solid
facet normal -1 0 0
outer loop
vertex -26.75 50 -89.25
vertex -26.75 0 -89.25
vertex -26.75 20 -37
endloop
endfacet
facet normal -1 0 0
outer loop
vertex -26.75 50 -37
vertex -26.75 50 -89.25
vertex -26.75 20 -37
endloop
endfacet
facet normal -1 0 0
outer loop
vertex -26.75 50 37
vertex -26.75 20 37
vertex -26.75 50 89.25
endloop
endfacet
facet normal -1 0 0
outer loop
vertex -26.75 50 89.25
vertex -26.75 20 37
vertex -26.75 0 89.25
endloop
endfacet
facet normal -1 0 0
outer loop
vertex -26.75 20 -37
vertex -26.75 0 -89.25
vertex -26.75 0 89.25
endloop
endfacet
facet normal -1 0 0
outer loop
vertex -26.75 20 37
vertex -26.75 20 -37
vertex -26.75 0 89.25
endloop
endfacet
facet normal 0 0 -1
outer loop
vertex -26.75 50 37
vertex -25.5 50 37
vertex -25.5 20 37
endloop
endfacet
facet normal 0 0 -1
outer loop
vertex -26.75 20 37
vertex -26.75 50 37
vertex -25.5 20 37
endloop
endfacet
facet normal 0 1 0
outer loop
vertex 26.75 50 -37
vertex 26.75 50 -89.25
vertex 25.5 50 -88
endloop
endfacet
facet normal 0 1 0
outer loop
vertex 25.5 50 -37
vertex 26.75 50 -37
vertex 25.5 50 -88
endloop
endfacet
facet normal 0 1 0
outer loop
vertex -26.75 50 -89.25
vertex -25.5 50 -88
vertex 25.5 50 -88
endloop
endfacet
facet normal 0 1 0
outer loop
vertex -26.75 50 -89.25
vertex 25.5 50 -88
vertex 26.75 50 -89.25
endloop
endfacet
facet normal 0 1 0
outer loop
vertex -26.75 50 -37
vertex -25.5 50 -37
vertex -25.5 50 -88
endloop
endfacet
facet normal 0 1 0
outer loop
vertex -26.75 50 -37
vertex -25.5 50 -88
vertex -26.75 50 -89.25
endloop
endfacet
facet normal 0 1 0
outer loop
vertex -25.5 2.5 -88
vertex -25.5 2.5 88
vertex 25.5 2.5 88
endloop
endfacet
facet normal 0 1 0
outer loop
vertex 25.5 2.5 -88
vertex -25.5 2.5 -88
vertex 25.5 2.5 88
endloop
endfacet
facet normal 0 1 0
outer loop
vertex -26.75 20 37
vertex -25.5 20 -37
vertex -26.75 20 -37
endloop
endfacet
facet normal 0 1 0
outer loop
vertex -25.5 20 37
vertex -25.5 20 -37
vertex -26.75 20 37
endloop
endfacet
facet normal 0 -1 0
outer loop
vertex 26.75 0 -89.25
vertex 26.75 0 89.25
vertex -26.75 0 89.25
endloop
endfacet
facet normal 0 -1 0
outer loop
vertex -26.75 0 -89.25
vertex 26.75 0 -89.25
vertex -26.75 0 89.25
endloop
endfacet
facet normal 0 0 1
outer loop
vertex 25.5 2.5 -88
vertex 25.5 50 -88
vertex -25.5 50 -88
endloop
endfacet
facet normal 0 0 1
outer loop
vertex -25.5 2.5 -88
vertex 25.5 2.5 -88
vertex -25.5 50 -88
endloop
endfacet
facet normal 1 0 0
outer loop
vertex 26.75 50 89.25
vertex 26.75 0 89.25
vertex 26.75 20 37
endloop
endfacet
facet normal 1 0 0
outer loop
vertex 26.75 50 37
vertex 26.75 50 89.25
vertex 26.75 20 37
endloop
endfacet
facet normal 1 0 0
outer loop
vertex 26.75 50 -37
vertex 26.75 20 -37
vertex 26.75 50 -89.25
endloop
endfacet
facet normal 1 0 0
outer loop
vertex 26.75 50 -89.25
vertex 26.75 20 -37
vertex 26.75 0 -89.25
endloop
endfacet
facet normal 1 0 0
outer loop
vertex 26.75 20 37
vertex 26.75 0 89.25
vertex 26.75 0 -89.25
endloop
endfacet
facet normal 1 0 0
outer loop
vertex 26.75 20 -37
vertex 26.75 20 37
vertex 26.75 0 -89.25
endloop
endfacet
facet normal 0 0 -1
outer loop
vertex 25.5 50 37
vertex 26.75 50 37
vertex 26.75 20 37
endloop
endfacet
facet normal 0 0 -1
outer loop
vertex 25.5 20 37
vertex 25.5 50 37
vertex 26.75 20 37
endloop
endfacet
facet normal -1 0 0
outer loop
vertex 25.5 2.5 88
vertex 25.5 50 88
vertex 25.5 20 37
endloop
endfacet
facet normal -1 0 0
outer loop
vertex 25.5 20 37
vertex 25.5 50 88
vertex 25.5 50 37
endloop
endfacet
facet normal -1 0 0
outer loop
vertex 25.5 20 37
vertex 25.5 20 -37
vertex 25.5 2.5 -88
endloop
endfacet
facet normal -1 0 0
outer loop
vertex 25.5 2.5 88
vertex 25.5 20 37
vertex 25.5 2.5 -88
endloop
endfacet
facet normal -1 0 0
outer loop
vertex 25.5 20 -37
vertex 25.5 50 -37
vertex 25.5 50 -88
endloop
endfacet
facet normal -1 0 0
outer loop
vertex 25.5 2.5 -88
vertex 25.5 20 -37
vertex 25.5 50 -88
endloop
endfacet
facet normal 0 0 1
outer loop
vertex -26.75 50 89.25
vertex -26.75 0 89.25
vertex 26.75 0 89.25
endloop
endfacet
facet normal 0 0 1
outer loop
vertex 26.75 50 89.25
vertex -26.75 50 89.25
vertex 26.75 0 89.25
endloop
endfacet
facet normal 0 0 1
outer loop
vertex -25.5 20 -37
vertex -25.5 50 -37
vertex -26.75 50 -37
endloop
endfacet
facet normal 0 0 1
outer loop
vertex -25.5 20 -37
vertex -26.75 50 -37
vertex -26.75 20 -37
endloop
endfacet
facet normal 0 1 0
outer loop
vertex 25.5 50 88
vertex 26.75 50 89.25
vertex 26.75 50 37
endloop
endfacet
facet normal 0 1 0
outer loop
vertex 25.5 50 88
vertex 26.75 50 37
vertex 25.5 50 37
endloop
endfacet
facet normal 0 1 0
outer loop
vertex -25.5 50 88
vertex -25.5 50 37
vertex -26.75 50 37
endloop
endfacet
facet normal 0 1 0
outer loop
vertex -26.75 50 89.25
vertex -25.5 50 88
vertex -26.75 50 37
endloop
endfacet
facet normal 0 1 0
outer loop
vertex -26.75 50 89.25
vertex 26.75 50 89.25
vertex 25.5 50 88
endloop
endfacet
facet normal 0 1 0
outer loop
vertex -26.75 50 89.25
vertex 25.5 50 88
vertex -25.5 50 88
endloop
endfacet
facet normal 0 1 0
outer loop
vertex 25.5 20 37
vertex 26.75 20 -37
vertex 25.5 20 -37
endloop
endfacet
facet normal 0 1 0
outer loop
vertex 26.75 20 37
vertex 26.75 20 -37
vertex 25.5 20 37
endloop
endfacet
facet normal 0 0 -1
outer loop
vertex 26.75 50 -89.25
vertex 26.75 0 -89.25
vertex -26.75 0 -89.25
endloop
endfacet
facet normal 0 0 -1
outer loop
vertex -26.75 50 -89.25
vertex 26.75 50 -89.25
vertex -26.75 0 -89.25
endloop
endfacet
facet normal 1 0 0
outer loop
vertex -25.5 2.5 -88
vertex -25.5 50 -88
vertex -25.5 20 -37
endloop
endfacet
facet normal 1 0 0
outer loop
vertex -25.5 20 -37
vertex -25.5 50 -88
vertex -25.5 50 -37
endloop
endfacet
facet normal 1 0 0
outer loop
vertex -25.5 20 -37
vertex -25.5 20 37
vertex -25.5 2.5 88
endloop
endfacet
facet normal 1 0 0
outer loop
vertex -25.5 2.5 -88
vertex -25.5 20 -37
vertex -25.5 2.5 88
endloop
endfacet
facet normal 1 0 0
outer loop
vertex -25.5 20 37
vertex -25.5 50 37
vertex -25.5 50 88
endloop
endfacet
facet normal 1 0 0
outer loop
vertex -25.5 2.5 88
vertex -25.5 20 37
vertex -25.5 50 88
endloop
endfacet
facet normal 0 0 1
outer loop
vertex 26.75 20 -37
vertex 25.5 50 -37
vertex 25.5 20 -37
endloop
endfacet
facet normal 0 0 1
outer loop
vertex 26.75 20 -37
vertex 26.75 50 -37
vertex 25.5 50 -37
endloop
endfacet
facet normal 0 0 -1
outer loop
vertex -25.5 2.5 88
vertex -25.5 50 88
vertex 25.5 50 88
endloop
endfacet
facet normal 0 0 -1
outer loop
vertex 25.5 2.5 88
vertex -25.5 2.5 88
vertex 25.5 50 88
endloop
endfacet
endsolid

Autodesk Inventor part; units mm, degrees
ref_plane "YZ Plane" through (0, 0, 0) normal (1, 0, 0) x (0, 1, 0)
ref_plane "XZ Plane" through (0, 0, 0) normal (0, 1, 0) x (-1, 0, 0)
ref_plane "XY Plane" through (0, 0, 0) normal (0, 0, 1) x (1, 0, 0)
sketch "Boceto1" plane through (0, 0, 0) normal (0, 1, 0) x (-1, 0, 0)
  line L0 (26.75, 89.25) -> (-26.75, 89.25)
  line L1 (-26.75, 89.25) -> (-26.75, -89.25)
  line L2 (-26.75, -89.25) -> (26.75, -89.25)
  line L3 (26.75, -89.25) -> (26.75, 89.25)
  line L4 (26.75, 89.25) -> (-26.75, -89.25) construction
  line L5 (-26.75, 89.25) -> (26.75, -89.25) construction
  point P0 (0, 0)
  dimension "d0" = 53.5
  dimension "d1" = 178.5
extrude "Extrusión1" add sketch "Boceto1" along normal blind 50
sketch "Boceto2" plane through (0, 50, 0) normal (0, 1, 0) x (1, 0, 0)
  line L0 (-25.5, -88) -> (25.5, -88)
  line L1 (25.5, -88) -> (25.5, 88)
  line L2 (25.5, 88) -> (-25.5, 88)
  line L3 (-25.5, 88) -> (-25.5, -88)
  line L4 (-25.5, -88) -> (25.5, 88) construction
  line L5 (25.5, -88) -> (-25.5, 88) construction
  point P0 (0, 0)
  dimension "d4" = 51
  dimension "d5" = 176
extrude "Extrusión2" cut sketch "Boceto2" against normal blind 47.5
sketch "Boceto3" plane through (26.75, 0, 89.25) normal (1, 0, 0) x (0, 0, -1)
  line L0 (52.25, 50) -> (52.25, 20)
  line L1 (0, 0) -> (178.5, 0) projected
  line L2 (126.25, 50) -> (126.25, 20)
  line L3 (126.25, 20) -> (52.25, 20)
  line L4 (52.25, 50) -> (126.25, 50)
  point P0 (89.25, 0)
  point P1 (177.25, 50)
  point P2 (1.25, 50)
  dimension "d9" = 30
extrude "Extrusión3" cut sketch "Boceto3" against normal through all
properties part number "Suport motor superior" material "Plástico ABS"
